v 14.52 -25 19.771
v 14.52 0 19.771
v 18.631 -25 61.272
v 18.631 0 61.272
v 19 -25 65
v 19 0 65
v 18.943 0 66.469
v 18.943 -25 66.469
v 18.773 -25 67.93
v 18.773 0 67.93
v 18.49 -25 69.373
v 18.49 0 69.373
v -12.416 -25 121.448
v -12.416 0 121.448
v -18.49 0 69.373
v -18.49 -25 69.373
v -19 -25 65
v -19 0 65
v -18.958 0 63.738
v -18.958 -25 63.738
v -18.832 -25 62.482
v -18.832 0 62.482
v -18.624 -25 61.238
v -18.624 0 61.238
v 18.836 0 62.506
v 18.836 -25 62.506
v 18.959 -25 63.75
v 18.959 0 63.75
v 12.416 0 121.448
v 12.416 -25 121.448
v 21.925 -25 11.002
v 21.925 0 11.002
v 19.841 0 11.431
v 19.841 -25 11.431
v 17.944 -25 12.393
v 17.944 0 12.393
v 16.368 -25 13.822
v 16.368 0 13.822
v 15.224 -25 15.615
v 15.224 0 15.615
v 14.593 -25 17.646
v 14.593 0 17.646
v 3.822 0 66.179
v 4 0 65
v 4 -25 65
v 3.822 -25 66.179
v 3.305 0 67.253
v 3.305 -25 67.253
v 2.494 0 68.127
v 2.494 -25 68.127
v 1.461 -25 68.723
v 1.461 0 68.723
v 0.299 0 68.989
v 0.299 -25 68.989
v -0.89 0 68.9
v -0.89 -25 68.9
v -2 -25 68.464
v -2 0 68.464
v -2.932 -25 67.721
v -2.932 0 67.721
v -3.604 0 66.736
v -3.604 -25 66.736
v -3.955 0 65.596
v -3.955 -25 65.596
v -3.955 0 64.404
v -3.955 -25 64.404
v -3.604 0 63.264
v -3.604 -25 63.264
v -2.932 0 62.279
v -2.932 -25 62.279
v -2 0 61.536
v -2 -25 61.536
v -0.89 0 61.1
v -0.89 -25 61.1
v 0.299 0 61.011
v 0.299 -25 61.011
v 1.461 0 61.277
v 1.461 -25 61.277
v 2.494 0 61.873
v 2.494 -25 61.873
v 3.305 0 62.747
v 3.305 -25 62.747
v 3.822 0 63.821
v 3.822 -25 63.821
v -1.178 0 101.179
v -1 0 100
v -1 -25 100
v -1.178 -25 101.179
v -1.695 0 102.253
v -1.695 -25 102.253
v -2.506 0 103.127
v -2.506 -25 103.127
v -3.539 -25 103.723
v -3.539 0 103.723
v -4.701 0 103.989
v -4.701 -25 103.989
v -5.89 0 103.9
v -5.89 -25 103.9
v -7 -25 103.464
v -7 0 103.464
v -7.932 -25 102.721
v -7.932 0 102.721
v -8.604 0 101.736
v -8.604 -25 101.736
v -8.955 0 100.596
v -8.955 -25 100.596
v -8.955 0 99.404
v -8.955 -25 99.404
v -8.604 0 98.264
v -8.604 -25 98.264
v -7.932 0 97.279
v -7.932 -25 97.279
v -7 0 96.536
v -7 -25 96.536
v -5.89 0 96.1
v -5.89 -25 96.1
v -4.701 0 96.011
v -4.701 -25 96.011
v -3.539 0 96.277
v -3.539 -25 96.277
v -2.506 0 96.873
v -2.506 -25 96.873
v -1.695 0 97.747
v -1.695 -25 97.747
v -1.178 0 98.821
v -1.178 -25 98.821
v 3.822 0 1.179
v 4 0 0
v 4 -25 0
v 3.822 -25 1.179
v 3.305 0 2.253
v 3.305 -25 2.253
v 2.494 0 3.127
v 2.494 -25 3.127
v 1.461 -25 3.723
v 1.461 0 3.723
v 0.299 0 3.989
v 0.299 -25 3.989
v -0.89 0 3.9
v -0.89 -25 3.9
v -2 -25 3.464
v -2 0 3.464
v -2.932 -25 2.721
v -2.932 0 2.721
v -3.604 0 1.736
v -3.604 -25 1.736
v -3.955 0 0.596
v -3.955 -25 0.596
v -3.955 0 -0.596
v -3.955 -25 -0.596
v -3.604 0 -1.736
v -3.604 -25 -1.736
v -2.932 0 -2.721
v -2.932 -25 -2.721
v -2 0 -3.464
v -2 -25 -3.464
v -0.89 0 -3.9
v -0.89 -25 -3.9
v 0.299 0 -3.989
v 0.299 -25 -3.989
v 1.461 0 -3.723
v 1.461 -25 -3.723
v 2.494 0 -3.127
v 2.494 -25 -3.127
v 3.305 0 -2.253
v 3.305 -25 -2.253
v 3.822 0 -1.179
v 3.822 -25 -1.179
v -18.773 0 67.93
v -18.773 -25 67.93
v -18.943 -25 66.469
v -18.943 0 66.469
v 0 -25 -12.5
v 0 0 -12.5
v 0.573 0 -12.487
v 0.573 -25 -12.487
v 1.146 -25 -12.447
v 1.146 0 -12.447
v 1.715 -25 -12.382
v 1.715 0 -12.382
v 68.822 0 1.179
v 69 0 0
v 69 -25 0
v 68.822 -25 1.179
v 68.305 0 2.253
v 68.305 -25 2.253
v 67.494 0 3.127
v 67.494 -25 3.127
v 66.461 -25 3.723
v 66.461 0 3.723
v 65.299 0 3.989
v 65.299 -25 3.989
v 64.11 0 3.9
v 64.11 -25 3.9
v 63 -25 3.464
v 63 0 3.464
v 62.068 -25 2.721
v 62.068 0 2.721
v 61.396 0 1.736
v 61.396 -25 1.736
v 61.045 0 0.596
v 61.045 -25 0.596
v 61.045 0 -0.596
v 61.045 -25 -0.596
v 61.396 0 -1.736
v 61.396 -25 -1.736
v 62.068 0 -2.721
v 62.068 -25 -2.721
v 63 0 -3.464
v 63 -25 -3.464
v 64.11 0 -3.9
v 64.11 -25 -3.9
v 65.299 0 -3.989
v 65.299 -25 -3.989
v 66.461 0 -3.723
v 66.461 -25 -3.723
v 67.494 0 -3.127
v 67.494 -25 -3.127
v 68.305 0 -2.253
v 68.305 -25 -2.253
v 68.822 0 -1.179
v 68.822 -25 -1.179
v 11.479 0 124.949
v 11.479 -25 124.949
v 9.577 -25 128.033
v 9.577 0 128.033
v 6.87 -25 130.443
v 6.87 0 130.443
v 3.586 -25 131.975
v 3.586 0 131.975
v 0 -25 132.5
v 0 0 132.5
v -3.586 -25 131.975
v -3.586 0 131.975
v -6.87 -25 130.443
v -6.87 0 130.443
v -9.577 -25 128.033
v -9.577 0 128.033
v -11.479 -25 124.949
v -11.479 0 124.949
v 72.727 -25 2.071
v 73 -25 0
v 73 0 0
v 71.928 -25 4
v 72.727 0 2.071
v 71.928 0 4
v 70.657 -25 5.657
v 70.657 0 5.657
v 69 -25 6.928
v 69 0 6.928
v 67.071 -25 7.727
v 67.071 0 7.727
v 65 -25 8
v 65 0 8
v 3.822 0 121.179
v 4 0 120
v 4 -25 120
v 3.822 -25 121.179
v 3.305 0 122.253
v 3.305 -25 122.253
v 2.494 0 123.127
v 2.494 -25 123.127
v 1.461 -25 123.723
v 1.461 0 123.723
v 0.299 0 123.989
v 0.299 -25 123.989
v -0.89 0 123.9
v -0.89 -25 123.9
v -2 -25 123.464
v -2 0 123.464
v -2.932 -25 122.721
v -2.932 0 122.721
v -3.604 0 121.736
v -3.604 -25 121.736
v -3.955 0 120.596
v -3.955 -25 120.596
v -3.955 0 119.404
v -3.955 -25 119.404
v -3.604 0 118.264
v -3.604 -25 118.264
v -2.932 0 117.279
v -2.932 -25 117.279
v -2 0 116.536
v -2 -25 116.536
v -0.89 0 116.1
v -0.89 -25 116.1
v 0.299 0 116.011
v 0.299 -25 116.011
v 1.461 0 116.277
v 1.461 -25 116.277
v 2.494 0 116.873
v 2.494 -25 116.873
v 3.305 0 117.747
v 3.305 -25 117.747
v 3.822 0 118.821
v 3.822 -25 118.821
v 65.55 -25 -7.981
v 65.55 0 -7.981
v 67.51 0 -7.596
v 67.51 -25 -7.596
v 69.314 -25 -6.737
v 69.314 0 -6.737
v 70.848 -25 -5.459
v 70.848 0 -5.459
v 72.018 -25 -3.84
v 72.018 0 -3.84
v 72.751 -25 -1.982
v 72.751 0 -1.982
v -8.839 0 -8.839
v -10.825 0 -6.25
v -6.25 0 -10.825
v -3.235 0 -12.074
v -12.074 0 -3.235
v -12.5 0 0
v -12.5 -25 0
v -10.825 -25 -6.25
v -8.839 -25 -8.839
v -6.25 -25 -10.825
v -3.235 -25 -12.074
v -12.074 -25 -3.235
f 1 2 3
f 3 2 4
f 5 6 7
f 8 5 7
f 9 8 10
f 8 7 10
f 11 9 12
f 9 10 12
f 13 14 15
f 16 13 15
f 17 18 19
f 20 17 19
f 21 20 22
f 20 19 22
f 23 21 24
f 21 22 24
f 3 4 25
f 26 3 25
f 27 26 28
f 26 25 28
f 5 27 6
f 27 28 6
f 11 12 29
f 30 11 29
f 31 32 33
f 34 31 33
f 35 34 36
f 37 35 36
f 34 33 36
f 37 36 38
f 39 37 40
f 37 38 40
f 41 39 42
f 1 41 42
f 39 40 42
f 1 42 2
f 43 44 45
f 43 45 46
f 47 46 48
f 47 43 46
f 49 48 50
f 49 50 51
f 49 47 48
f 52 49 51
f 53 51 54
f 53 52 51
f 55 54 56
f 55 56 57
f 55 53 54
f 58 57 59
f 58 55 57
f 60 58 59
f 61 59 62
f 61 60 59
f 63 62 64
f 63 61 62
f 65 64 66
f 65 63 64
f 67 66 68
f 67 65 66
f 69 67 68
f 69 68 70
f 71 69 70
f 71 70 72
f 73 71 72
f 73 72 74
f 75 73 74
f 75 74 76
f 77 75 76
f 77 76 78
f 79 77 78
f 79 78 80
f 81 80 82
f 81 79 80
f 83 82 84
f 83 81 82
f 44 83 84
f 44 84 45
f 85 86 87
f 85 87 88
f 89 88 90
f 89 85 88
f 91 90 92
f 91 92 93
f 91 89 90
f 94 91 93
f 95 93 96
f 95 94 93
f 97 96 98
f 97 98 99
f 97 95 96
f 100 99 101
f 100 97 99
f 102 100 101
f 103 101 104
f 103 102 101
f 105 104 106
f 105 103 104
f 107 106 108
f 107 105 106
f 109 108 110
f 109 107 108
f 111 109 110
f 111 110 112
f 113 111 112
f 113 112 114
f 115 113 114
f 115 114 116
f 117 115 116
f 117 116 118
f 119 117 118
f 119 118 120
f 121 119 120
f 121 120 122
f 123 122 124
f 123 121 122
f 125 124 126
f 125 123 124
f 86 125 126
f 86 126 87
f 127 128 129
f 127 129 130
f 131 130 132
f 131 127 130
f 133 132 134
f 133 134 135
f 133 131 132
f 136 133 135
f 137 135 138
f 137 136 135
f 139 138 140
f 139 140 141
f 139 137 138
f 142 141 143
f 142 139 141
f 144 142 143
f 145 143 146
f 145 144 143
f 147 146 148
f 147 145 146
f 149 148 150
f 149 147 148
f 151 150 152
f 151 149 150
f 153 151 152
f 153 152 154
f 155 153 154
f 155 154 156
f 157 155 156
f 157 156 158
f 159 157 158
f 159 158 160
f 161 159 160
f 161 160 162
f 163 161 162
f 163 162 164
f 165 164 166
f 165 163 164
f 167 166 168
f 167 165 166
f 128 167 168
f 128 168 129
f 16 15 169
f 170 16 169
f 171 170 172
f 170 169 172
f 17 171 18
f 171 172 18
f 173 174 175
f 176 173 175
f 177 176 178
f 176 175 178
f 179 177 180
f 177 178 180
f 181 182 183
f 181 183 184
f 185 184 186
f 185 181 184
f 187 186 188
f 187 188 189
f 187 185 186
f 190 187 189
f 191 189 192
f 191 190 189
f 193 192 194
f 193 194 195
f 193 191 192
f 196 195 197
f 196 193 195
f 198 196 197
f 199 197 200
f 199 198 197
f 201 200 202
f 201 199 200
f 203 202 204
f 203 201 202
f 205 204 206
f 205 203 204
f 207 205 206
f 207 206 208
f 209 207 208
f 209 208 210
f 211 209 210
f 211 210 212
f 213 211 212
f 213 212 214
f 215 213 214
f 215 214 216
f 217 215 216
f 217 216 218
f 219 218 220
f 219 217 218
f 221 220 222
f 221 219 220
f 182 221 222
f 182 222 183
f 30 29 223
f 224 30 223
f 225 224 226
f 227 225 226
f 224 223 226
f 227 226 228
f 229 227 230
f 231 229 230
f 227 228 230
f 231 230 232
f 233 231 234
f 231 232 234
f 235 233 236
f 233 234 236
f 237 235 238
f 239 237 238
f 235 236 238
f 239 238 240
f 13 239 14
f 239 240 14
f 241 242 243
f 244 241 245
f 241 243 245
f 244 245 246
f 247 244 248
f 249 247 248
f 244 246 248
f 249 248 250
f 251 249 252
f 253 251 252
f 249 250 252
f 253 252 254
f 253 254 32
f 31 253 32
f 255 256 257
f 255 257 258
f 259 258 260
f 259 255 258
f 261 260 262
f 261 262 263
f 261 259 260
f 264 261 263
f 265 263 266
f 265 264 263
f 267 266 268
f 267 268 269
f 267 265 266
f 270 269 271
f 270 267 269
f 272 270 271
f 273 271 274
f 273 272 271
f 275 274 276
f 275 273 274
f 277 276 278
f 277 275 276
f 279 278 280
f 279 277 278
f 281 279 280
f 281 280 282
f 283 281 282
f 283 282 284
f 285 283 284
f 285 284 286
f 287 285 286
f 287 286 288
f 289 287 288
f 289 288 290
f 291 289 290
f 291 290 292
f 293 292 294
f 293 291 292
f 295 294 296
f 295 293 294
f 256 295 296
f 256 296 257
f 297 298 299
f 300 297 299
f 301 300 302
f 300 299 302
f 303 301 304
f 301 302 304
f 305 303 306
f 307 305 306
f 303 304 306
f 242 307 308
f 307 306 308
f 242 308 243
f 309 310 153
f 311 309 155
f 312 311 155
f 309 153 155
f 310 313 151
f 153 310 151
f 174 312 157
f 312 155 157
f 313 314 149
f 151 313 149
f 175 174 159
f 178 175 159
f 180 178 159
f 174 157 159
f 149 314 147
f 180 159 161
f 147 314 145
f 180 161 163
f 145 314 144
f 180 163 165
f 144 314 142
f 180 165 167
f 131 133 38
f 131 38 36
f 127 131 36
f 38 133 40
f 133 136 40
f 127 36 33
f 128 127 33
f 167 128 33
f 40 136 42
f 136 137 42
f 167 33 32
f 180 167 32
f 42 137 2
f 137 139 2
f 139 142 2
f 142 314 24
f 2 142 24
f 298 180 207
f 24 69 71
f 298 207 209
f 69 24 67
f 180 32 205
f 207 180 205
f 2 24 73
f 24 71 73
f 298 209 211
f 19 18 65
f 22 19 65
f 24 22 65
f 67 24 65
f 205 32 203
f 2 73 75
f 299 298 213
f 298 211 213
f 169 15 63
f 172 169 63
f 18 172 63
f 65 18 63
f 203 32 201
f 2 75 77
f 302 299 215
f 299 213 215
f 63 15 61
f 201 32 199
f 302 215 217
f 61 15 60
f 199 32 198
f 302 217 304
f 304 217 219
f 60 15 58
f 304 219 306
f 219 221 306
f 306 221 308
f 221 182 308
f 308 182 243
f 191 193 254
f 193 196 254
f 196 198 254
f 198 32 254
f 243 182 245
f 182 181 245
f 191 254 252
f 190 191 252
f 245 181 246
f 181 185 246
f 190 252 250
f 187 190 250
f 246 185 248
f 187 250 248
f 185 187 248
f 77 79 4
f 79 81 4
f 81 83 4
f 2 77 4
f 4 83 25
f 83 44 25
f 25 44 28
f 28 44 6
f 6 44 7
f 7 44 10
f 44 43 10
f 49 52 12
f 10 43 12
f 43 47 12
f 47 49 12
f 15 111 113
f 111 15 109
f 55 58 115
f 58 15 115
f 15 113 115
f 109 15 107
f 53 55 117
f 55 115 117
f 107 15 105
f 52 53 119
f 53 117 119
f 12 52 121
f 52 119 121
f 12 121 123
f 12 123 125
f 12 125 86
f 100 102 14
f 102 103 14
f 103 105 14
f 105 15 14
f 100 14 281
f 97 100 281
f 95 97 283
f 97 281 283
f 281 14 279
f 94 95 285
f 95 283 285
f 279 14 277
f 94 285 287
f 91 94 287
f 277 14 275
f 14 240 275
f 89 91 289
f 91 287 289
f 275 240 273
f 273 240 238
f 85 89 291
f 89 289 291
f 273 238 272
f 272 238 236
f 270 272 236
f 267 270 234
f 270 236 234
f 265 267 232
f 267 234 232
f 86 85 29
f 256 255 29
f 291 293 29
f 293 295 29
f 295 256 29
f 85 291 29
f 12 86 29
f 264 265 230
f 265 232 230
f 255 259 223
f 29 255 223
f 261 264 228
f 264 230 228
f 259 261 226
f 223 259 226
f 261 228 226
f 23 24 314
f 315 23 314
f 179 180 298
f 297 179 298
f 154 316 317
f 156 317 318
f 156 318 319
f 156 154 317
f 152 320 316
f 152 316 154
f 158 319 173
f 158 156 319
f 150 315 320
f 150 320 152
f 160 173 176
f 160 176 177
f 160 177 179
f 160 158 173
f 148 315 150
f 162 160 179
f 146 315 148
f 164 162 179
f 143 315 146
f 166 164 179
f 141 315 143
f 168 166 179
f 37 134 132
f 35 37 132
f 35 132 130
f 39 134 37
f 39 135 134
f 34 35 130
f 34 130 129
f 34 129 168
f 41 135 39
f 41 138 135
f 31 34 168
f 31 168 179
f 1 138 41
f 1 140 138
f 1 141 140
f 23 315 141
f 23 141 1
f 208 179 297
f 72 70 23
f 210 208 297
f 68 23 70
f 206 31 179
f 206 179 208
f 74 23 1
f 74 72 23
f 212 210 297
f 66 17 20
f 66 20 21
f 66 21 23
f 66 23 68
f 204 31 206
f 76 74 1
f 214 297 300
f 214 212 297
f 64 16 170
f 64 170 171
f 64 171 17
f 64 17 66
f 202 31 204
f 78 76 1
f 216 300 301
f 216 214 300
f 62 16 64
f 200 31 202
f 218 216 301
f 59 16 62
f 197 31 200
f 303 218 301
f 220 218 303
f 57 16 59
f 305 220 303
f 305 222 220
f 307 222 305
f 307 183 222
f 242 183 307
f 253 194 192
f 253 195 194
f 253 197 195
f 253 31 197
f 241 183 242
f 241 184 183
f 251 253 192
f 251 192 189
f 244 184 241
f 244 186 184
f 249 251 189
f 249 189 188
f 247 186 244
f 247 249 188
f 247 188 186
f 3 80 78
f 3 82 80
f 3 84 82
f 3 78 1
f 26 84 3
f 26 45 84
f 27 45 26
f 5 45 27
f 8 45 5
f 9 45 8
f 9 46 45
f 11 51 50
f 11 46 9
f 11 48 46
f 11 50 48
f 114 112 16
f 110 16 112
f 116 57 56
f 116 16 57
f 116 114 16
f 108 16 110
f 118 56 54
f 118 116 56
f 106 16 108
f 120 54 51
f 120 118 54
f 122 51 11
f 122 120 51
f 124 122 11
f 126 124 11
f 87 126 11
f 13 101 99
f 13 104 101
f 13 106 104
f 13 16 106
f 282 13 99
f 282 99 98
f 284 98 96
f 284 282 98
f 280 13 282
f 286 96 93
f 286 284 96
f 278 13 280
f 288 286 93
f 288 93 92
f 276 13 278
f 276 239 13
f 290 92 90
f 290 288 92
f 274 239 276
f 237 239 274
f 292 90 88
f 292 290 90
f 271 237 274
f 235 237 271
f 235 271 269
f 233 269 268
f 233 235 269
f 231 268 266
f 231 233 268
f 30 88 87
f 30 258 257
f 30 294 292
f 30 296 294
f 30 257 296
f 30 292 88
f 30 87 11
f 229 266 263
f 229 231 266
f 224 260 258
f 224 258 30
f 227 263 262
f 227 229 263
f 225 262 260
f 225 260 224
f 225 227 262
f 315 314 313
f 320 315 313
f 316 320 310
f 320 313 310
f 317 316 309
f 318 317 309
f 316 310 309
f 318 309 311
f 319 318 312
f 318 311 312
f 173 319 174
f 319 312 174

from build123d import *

# Parameters (mm, degrees)
F0_R     = 4
F1_DEPTH = 25


with BuildPart() as f1:
    # F0 (on Front) → F1 (new body)
    with BuildSketch(Plane.XZ):
        with BuildLine():
            ThreePointArc((1.7153142053, -12.3817485509), (9.425800432, -8.2100113408), (12.5, 0))
            ThreePointArc((12.5, 0), (0, 12.5), (-12.5, 0))
            ThreePointArc((-12.5, 0), (-8.8388347648, -8.8388347648), (0, -12.5))
            Line((0, -12.5), (1.7153142053, -12.3817485509))
        make_face()
        Circle(F0_R, mode=Mode.SUBTRACT)
        with BuildLine():
            ThreePointArc((-12.5, 0), (0, 12.5), (12.5, 0))
            ThreePointArc((12.5, 0), (9.425800432, -8.2100113408), (1.7153142053, -12.3817485509))
            Line((1.7153142053, -12.3817485509), (65.5502033349, -7.9810573416))
            ThreePointArc((65.5502033349, -7.9810573416), (57.0047370671, -0.2752646609), (65, 8))
            Line((65, 8), (21.9245263595, 11.0022438251))
            ThreePointArc((21.9245263595, 11.0022438251), (16.3684000055, 13.8215743024), (14.5197193706, 19.771493992))
            Line((14.5197193706, 19.771493992), (18.6307429943, 61.272344506))
            ThreePointArc((18.6307429943, 61.272344506), (0.0177077601, 46.0000082517), (-18.6237623762, 61.2376237624))
            Line((-18.6237623762, 61.2376237624), (-12.5, 0))
        make_face()
        with BuildLine():
            ThreePointArc((0, -12.5), (0.8596927108, -12.4704020963), (1.7153142053, -12.3817485509))
            Line((1.7153142053, -12.3817485509), (0, -12.5))
        make_face()
        with BuildLine():
            Line((-19, 65), (-18.6237623762, 61.2376237624))
            ThreePointArc((-18.6237623762, 61.2376237624), (0.0177077601, 46.0000082517), (18.6307429943, 61.272344506))
            Line((18.6307429943, 61.272344506), (19, 65))
            Line((19, 65), (18.4899446576, 69.3728648001))
            ThreePointArc((18.4899446576, 69.3728648001), (0, 84), (-18.4899446576, 69.3728648001))
            Line((-18.4899446576, 69.3728648001), (-19, 65))
        make_face()
        with Locations((0, 65)):
            Circle(F0_R, mode=Mode.SUBTRACT)
        with BuildLine():
            ThreePointArc((-19, 65), (-18.905706614, 63.1094293386), (-18.6237623762, 61.2376237624))
            Line((-18.6237623762, 61.2376237624), (-19, 65))
        make_face()
        with BuildLine():
            ThreePointArc((65, 8), (57.0047370671, -0.2752646609), (65.5502033349, -7.9810573416))
            ThreePointArc((65.5502033349, -7.9810573416), (70.8481461455, -5.4588631289), (73, 0))
            ThreePointArc((73, 0), (70.6568542495, 5.6568542495), (65, 8))
        make_face()
        with Locations((65, 0)):
            Circle(F0_R, mode=Mode.SUBTRACT)
        with BuildLine():
            ThreePointArc((-18.4899446576, 69.3728648001), (-18.8720553795, 67.2012554947), (-19, 65))
            Line((-19, 65), (-18.4899446576, 69.3728648001))
        make_face()
        with BuildLine():
            Line((19, 65), (18.6307429943, 61.272344506))
            ThreePointArc((18.6307429943, 61.272344506), (18.9074603912, 63.1270500395), (19, 65))
        make_face()
        with BuildLine():
            Line((-12.4158259076, 121.4481944044), (-18.4899446576, 69.3728648001))
            ThreePointArc((-18.4899446576, 69.3728648001), (0, 84), (18.4899446576, 69.3728648001))
            Line((18.4899446576, 69.3728648001), (12.4158259076, 121.4481944044))
            ThreePointArc((12.4158259076, 121.4481944044), (12.4789387338, 120.7253192936), (12.5, 120))
            ThreePointArc((12.5, 120), (-0.7253192936, 107.5210612662), (-12.4158259076, 121.4481944044))
        make_face()
        with Locations((-5, 100)):
            Circle(F0_R, mode=Mode.SUBTRACT)
        with BuildLine():
            Line((18.4899446576, 69.3728648001), (19, 65))
            ThreePointArc((19, 65), (18.8720553795, 67.2012554947), (18.4899446576, 69.3728648001))
        make_face()
        with BuildLine():
            ThreePointArc((12.4158259076, 121.4481944044), (0, 132.5), (-12.4158259076, 121.4481944044))
            ThreePointArc((-12.4158259076, 121.4481944044), (-0.7253192936, 107.5210612662), (12.5, 120))
            ThreePointArc((12.5, 120), (12.4789387338, 120.7253192936), (12.4158259076, 121.4481944044))
        make_face()
        with Locations((0, 120)):
            Circle(F0_R, mode=Mode.SUBTRACT)
    extrude(amount=F1_DEPTH)


solid = f1.part
